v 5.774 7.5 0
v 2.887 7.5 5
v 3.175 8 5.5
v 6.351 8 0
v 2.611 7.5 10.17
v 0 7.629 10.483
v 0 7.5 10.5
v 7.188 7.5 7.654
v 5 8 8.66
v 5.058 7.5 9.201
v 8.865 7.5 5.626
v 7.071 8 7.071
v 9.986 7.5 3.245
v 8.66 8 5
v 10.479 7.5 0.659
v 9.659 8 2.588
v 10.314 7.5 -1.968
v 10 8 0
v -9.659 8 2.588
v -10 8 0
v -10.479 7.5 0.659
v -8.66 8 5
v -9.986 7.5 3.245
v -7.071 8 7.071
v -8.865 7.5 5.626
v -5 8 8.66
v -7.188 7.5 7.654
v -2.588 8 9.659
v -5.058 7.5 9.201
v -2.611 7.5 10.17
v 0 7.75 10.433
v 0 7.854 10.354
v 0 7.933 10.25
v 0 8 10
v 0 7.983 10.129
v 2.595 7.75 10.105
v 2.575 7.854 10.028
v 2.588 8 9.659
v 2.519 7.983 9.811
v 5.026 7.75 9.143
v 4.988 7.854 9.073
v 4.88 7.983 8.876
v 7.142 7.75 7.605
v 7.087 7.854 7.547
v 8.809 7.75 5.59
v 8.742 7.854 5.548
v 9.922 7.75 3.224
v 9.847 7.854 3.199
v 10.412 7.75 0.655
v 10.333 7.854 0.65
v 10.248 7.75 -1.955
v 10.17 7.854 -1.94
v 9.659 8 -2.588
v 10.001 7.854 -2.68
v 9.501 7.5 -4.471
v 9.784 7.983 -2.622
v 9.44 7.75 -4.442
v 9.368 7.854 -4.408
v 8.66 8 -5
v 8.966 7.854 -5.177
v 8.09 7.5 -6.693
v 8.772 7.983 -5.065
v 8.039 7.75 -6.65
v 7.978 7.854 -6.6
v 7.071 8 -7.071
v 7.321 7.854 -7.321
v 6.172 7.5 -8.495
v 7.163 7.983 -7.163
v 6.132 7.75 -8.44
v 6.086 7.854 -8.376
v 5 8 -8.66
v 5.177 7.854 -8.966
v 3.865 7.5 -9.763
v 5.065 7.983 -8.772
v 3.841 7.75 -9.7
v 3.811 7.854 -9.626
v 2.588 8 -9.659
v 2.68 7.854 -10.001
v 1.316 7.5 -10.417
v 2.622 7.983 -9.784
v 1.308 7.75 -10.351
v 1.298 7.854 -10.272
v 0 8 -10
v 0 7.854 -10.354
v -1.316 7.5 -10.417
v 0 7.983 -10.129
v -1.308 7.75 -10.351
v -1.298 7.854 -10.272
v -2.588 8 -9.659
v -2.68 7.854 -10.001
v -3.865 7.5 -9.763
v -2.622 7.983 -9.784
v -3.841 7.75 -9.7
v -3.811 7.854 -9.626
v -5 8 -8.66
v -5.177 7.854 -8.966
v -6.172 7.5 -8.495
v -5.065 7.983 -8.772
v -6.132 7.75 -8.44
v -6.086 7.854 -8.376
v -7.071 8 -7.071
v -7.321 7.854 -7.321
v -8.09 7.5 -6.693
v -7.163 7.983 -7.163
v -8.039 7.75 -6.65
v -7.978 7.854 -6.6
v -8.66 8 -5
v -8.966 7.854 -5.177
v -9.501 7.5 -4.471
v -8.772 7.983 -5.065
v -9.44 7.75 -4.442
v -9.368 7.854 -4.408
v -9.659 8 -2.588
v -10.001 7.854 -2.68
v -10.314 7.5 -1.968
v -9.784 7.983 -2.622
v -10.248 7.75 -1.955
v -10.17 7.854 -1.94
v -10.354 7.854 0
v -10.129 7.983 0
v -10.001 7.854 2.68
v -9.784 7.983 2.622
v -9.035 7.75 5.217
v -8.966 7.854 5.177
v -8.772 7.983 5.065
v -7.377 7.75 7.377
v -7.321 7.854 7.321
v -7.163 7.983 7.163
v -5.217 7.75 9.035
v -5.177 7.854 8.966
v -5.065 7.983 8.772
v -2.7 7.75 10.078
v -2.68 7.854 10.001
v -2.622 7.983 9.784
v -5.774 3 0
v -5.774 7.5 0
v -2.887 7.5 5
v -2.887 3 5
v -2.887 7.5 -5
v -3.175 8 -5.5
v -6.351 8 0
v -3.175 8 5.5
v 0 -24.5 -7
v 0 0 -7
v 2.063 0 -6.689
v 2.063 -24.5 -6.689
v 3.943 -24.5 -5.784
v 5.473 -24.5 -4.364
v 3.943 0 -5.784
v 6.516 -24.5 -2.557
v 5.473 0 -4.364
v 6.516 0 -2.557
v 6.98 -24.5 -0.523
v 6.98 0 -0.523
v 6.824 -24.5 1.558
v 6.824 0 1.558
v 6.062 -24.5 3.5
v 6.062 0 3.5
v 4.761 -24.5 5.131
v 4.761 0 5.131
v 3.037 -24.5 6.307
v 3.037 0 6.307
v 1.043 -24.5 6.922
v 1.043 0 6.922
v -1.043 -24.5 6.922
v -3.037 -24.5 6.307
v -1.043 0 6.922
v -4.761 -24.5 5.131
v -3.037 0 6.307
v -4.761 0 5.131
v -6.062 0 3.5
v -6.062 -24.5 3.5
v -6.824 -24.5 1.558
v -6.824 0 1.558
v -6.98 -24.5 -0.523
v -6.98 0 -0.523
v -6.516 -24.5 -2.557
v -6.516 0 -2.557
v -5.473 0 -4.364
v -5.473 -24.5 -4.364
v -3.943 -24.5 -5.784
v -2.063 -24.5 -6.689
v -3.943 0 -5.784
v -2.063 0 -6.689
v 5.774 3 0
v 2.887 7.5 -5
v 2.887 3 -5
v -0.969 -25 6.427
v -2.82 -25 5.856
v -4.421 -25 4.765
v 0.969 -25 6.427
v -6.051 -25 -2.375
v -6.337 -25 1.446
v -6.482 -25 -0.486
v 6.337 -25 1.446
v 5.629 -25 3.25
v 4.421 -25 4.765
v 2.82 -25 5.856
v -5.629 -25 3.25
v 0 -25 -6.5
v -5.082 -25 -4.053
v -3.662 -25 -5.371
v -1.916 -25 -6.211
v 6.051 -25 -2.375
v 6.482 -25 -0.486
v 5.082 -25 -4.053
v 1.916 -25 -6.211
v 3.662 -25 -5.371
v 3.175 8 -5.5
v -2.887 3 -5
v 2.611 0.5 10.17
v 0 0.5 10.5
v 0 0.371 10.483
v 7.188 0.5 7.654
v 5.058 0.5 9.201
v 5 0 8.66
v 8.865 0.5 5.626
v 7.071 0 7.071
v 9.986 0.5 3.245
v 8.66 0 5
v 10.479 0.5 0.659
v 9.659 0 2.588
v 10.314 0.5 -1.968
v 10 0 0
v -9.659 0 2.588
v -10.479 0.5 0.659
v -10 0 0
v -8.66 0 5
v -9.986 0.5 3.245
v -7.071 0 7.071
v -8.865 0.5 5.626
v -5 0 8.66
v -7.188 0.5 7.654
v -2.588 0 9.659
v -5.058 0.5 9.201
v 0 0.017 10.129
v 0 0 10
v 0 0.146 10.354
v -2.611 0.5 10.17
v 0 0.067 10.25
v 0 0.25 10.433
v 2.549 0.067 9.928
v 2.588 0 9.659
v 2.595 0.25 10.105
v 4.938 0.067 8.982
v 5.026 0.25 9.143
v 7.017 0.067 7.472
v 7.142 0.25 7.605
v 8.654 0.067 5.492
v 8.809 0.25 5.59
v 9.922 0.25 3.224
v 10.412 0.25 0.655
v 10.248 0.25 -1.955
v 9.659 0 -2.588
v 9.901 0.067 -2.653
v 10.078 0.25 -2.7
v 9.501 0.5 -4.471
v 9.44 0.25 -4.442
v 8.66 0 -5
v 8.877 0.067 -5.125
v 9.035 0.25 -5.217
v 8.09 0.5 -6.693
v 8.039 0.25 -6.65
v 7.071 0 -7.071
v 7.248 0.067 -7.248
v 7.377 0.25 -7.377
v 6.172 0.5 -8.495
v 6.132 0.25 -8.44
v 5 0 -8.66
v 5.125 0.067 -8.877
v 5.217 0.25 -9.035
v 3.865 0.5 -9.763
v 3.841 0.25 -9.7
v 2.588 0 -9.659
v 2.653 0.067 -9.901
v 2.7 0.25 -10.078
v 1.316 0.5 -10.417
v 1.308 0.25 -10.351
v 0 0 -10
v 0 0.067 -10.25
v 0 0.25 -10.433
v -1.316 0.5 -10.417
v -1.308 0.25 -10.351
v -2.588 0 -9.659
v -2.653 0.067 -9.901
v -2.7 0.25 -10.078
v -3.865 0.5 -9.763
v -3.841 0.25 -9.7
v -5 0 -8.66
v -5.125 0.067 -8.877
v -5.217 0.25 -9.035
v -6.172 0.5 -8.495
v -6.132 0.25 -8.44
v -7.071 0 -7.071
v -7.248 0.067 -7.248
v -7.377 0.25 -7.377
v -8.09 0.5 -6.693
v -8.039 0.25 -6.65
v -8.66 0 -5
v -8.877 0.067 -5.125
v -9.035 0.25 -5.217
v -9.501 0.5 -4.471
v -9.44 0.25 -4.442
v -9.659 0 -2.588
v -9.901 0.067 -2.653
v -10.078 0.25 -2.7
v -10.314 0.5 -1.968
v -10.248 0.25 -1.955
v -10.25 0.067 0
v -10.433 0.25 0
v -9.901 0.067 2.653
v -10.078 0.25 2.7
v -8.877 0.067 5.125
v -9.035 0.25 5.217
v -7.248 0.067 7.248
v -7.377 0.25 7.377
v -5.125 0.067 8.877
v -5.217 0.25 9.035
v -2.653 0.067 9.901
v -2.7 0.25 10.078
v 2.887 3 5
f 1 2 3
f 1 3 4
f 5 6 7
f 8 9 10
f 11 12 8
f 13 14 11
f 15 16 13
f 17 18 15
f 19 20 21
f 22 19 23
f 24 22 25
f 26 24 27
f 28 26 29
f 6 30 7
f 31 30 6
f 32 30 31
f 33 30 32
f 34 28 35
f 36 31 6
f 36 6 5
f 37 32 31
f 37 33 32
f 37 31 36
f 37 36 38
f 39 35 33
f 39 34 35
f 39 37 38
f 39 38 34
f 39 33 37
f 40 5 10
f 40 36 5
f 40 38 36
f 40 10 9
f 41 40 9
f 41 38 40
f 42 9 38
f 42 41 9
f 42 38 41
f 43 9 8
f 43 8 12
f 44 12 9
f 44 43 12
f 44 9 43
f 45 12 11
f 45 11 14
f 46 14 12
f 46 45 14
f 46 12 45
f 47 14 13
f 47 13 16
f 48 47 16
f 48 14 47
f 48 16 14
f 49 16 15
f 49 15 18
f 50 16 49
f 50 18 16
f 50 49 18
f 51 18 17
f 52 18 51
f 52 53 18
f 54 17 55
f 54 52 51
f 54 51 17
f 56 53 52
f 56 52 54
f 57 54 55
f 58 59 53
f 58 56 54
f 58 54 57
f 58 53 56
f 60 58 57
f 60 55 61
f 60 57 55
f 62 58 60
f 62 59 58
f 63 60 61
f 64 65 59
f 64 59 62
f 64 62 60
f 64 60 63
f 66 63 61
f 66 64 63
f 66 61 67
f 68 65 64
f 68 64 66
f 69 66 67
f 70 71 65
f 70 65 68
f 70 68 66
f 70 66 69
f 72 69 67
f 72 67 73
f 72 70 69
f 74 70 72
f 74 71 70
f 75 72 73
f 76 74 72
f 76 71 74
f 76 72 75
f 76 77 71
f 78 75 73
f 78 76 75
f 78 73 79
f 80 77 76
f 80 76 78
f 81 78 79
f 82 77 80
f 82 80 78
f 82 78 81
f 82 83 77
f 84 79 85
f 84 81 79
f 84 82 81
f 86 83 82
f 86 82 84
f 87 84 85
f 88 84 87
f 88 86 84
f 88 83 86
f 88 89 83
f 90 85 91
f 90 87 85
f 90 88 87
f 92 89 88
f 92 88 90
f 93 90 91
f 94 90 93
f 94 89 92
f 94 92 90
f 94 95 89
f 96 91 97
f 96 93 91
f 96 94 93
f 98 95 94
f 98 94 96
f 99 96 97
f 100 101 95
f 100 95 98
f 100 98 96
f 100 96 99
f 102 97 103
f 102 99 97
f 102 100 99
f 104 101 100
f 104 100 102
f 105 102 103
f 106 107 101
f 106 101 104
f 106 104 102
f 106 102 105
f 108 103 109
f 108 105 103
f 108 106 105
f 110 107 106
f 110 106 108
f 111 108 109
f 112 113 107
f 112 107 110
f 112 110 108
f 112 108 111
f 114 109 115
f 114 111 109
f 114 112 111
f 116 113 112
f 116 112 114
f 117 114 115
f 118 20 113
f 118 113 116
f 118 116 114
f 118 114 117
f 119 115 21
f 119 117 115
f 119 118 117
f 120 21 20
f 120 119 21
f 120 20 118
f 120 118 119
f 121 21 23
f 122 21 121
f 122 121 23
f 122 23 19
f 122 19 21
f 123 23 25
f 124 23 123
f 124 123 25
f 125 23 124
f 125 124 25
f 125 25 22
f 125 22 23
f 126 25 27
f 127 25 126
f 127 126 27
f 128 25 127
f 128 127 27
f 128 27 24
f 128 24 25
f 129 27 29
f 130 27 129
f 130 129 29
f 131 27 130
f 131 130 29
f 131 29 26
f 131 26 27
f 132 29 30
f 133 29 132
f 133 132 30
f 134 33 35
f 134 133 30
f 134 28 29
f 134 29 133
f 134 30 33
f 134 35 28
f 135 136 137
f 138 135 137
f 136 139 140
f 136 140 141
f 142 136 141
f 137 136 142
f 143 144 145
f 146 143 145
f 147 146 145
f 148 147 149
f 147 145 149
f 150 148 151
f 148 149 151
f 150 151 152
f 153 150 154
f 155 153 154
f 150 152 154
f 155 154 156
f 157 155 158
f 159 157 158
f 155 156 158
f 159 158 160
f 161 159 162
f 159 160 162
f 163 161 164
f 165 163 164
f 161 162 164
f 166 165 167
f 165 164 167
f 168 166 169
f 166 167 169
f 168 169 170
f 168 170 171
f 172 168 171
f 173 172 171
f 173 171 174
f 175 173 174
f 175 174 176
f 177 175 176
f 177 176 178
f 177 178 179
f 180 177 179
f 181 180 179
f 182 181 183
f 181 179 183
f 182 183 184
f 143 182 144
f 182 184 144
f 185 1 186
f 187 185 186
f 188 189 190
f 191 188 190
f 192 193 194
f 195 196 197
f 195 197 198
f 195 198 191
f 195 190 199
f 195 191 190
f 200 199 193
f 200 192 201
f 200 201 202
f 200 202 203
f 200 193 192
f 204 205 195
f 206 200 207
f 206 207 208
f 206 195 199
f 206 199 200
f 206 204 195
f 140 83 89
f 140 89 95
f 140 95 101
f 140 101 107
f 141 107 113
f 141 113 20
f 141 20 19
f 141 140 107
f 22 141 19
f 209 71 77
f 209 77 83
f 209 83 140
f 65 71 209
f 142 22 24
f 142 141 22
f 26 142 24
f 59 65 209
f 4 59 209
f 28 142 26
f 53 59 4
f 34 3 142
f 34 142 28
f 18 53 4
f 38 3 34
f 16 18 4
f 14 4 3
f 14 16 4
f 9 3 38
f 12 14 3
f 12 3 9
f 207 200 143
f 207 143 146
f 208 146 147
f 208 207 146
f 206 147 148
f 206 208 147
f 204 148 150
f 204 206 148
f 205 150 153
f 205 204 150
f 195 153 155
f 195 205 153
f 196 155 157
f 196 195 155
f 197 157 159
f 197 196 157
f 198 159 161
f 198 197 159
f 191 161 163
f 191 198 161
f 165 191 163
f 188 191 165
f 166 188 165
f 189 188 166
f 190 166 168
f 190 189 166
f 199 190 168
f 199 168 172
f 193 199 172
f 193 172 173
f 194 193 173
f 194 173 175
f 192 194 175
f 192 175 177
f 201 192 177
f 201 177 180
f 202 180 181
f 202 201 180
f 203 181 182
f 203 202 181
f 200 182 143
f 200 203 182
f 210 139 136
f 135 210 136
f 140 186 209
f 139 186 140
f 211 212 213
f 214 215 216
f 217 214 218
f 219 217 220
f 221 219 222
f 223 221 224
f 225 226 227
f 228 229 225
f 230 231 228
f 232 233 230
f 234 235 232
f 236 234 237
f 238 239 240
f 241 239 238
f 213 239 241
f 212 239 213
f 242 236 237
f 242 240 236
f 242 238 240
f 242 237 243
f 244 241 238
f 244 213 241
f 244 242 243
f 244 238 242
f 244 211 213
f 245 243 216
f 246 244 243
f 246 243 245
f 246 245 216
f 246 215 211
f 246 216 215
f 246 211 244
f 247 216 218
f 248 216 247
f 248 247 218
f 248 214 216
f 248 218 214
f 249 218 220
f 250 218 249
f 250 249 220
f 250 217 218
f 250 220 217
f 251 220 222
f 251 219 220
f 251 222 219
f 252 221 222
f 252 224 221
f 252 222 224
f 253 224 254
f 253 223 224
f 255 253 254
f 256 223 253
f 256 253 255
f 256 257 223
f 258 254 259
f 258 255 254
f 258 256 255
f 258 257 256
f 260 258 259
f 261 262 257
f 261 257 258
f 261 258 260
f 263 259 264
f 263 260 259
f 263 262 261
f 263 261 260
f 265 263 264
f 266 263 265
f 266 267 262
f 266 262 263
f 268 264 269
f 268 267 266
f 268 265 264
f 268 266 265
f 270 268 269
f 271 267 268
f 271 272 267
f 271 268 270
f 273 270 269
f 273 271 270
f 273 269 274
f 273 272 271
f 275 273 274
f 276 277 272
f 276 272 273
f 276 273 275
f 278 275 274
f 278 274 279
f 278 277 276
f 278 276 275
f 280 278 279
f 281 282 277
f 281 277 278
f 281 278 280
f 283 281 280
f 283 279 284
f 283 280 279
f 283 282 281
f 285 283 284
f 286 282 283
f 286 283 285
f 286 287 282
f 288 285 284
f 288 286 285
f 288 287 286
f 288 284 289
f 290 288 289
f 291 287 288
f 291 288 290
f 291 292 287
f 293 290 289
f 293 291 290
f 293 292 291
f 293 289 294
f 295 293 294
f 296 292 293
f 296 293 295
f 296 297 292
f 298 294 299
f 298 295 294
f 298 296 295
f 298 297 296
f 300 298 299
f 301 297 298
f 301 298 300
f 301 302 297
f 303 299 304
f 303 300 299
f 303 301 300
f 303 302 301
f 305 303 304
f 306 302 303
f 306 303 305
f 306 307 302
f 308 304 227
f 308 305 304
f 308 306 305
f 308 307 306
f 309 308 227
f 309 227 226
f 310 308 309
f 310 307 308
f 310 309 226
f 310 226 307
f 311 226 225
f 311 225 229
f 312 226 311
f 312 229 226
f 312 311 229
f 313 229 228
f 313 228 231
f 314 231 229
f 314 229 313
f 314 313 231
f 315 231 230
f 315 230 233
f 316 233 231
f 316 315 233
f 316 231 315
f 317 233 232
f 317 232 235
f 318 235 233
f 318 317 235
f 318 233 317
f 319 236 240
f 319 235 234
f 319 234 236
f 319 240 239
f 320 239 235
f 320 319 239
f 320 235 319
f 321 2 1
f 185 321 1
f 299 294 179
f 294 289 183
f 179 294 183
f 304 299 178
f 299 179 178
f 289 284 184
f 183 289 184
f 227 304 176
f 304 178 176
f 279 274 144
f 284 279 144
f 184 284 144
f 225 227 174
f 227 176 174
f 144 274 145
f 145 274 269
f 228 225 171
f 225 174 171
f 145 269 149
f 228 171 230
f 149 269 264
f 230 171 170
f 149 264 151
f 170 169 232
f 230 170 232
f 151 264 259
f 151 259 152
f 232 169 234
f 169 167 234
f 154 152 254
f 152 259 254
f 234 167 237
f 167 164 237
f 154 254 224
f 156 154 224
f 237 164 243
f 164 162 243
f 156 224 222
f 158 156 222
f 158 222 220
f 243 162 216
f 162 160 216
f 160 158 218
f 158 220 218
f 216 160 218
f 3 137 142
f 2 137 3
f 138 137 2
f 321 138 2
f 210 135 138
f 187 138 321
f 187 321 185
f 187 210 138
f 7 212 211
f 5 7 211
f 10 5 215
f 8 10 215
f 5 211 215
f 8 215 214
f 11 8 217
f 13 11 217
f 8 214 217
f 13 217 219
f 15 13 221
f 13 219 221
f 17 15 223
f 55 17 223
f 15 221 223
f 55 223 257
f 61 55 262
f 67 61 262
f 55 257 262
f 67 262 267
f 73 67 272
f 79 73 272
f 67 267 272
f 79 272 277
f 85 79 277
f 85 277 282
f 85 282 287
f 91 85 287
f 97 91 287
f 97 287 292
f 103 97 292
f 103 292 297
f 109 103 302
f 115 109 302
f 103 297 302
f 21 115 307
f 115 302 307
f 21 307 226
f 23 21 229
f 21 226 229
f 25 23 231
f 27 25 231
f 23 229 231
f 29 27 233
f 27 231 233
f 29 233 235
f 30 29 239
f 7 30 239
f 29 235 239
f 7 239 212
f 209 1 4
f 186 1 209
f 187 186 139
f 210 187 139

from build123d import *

# Parameters (mm, degrees)
SKETCH_1_R          = 10.5
EXTRUDE_1_DEPTH     = 8
SKETCH_2_R          = 7
EXTRUDE_2_DEPTH     = 25
CUT_EXTRUDE_1_DEPTH = 5
CHAMFER_1_SIZE      = 0.5
FILLET_1_R          = 0.5
CHAMFER_2_SIZE      = 0.5


with BuildPart() as part:
    # 草图1 → 凸台-拉伸1 (new body)
    with BuildSketch(Plane(origin=(0, 0, 0), x_dir=(1, 0, 0), z_dir=(0, 1, 0))):
        with Locations(Location((0, 0, 0), (0, 0, 270))):
            Circle(SKETCH_1_R)
    extrude(amount=EXTRUDE_1_DEPTH)

    # 草图2 → 凸台-拉伸2 (add)
    with BuildSketch(Plane.XZ):
        with Locations(Location((0, 0, 0), (0, 0, 270))):
            Circle(SKETCH_2_R)
    extrude(amount=EXTRUDE_2_DEPTH)

    # 草图3 → 切除-拉伸1 (cut)
    with BuildSketch(Plane(origin=(0, 8, 0), x_dir=(1, 0, 0), z_dir=(0, 1, 0))):
        Polygon((5.773502692, 0), (2.886751346, 5), (-2.886751346, 5), (-5.773502692, 0), (-2.886751346, -5), (2.886751346, -5), align=None)
    extrude(amount=-CUT_EXTRUDE_1_DEPTH, mode=Mode.SUBTRACT)

    # 倒角1
    chamfer_1_edges = [part.edges().sort_by_distance(p)[0] for p in [
        (0, -25, 7),
    ]]
    chamfer(chamfer_1_edges, length=CHAMFER_1_SIZE)

    # 圆角1
    fillet_1_edges = [part.edges().sort_by_distance(p)[0] for p in [
        (0, 0, -10.5),
        (0, 8, -10.5),
    ]]
    fillet(fillet_1_edges, radius=FILLET_1_R)

    # 倒角2
    chamfer_2_edges = [part.edges().sort_by_distance(p)[0] for p in [
        (4.330127019, 8, 2.5),
        (4.330127019, 8, -2.5),
        (0, 8, -5),
        (-4.330127019, 8, -2.5),
        (-4.330127019, 8, 2.5),
        (0, 8, 5),
    ]]
    chamfer(chamfer_2_edges, length=CHAMFER_2_SIZE)


solid = part.part
